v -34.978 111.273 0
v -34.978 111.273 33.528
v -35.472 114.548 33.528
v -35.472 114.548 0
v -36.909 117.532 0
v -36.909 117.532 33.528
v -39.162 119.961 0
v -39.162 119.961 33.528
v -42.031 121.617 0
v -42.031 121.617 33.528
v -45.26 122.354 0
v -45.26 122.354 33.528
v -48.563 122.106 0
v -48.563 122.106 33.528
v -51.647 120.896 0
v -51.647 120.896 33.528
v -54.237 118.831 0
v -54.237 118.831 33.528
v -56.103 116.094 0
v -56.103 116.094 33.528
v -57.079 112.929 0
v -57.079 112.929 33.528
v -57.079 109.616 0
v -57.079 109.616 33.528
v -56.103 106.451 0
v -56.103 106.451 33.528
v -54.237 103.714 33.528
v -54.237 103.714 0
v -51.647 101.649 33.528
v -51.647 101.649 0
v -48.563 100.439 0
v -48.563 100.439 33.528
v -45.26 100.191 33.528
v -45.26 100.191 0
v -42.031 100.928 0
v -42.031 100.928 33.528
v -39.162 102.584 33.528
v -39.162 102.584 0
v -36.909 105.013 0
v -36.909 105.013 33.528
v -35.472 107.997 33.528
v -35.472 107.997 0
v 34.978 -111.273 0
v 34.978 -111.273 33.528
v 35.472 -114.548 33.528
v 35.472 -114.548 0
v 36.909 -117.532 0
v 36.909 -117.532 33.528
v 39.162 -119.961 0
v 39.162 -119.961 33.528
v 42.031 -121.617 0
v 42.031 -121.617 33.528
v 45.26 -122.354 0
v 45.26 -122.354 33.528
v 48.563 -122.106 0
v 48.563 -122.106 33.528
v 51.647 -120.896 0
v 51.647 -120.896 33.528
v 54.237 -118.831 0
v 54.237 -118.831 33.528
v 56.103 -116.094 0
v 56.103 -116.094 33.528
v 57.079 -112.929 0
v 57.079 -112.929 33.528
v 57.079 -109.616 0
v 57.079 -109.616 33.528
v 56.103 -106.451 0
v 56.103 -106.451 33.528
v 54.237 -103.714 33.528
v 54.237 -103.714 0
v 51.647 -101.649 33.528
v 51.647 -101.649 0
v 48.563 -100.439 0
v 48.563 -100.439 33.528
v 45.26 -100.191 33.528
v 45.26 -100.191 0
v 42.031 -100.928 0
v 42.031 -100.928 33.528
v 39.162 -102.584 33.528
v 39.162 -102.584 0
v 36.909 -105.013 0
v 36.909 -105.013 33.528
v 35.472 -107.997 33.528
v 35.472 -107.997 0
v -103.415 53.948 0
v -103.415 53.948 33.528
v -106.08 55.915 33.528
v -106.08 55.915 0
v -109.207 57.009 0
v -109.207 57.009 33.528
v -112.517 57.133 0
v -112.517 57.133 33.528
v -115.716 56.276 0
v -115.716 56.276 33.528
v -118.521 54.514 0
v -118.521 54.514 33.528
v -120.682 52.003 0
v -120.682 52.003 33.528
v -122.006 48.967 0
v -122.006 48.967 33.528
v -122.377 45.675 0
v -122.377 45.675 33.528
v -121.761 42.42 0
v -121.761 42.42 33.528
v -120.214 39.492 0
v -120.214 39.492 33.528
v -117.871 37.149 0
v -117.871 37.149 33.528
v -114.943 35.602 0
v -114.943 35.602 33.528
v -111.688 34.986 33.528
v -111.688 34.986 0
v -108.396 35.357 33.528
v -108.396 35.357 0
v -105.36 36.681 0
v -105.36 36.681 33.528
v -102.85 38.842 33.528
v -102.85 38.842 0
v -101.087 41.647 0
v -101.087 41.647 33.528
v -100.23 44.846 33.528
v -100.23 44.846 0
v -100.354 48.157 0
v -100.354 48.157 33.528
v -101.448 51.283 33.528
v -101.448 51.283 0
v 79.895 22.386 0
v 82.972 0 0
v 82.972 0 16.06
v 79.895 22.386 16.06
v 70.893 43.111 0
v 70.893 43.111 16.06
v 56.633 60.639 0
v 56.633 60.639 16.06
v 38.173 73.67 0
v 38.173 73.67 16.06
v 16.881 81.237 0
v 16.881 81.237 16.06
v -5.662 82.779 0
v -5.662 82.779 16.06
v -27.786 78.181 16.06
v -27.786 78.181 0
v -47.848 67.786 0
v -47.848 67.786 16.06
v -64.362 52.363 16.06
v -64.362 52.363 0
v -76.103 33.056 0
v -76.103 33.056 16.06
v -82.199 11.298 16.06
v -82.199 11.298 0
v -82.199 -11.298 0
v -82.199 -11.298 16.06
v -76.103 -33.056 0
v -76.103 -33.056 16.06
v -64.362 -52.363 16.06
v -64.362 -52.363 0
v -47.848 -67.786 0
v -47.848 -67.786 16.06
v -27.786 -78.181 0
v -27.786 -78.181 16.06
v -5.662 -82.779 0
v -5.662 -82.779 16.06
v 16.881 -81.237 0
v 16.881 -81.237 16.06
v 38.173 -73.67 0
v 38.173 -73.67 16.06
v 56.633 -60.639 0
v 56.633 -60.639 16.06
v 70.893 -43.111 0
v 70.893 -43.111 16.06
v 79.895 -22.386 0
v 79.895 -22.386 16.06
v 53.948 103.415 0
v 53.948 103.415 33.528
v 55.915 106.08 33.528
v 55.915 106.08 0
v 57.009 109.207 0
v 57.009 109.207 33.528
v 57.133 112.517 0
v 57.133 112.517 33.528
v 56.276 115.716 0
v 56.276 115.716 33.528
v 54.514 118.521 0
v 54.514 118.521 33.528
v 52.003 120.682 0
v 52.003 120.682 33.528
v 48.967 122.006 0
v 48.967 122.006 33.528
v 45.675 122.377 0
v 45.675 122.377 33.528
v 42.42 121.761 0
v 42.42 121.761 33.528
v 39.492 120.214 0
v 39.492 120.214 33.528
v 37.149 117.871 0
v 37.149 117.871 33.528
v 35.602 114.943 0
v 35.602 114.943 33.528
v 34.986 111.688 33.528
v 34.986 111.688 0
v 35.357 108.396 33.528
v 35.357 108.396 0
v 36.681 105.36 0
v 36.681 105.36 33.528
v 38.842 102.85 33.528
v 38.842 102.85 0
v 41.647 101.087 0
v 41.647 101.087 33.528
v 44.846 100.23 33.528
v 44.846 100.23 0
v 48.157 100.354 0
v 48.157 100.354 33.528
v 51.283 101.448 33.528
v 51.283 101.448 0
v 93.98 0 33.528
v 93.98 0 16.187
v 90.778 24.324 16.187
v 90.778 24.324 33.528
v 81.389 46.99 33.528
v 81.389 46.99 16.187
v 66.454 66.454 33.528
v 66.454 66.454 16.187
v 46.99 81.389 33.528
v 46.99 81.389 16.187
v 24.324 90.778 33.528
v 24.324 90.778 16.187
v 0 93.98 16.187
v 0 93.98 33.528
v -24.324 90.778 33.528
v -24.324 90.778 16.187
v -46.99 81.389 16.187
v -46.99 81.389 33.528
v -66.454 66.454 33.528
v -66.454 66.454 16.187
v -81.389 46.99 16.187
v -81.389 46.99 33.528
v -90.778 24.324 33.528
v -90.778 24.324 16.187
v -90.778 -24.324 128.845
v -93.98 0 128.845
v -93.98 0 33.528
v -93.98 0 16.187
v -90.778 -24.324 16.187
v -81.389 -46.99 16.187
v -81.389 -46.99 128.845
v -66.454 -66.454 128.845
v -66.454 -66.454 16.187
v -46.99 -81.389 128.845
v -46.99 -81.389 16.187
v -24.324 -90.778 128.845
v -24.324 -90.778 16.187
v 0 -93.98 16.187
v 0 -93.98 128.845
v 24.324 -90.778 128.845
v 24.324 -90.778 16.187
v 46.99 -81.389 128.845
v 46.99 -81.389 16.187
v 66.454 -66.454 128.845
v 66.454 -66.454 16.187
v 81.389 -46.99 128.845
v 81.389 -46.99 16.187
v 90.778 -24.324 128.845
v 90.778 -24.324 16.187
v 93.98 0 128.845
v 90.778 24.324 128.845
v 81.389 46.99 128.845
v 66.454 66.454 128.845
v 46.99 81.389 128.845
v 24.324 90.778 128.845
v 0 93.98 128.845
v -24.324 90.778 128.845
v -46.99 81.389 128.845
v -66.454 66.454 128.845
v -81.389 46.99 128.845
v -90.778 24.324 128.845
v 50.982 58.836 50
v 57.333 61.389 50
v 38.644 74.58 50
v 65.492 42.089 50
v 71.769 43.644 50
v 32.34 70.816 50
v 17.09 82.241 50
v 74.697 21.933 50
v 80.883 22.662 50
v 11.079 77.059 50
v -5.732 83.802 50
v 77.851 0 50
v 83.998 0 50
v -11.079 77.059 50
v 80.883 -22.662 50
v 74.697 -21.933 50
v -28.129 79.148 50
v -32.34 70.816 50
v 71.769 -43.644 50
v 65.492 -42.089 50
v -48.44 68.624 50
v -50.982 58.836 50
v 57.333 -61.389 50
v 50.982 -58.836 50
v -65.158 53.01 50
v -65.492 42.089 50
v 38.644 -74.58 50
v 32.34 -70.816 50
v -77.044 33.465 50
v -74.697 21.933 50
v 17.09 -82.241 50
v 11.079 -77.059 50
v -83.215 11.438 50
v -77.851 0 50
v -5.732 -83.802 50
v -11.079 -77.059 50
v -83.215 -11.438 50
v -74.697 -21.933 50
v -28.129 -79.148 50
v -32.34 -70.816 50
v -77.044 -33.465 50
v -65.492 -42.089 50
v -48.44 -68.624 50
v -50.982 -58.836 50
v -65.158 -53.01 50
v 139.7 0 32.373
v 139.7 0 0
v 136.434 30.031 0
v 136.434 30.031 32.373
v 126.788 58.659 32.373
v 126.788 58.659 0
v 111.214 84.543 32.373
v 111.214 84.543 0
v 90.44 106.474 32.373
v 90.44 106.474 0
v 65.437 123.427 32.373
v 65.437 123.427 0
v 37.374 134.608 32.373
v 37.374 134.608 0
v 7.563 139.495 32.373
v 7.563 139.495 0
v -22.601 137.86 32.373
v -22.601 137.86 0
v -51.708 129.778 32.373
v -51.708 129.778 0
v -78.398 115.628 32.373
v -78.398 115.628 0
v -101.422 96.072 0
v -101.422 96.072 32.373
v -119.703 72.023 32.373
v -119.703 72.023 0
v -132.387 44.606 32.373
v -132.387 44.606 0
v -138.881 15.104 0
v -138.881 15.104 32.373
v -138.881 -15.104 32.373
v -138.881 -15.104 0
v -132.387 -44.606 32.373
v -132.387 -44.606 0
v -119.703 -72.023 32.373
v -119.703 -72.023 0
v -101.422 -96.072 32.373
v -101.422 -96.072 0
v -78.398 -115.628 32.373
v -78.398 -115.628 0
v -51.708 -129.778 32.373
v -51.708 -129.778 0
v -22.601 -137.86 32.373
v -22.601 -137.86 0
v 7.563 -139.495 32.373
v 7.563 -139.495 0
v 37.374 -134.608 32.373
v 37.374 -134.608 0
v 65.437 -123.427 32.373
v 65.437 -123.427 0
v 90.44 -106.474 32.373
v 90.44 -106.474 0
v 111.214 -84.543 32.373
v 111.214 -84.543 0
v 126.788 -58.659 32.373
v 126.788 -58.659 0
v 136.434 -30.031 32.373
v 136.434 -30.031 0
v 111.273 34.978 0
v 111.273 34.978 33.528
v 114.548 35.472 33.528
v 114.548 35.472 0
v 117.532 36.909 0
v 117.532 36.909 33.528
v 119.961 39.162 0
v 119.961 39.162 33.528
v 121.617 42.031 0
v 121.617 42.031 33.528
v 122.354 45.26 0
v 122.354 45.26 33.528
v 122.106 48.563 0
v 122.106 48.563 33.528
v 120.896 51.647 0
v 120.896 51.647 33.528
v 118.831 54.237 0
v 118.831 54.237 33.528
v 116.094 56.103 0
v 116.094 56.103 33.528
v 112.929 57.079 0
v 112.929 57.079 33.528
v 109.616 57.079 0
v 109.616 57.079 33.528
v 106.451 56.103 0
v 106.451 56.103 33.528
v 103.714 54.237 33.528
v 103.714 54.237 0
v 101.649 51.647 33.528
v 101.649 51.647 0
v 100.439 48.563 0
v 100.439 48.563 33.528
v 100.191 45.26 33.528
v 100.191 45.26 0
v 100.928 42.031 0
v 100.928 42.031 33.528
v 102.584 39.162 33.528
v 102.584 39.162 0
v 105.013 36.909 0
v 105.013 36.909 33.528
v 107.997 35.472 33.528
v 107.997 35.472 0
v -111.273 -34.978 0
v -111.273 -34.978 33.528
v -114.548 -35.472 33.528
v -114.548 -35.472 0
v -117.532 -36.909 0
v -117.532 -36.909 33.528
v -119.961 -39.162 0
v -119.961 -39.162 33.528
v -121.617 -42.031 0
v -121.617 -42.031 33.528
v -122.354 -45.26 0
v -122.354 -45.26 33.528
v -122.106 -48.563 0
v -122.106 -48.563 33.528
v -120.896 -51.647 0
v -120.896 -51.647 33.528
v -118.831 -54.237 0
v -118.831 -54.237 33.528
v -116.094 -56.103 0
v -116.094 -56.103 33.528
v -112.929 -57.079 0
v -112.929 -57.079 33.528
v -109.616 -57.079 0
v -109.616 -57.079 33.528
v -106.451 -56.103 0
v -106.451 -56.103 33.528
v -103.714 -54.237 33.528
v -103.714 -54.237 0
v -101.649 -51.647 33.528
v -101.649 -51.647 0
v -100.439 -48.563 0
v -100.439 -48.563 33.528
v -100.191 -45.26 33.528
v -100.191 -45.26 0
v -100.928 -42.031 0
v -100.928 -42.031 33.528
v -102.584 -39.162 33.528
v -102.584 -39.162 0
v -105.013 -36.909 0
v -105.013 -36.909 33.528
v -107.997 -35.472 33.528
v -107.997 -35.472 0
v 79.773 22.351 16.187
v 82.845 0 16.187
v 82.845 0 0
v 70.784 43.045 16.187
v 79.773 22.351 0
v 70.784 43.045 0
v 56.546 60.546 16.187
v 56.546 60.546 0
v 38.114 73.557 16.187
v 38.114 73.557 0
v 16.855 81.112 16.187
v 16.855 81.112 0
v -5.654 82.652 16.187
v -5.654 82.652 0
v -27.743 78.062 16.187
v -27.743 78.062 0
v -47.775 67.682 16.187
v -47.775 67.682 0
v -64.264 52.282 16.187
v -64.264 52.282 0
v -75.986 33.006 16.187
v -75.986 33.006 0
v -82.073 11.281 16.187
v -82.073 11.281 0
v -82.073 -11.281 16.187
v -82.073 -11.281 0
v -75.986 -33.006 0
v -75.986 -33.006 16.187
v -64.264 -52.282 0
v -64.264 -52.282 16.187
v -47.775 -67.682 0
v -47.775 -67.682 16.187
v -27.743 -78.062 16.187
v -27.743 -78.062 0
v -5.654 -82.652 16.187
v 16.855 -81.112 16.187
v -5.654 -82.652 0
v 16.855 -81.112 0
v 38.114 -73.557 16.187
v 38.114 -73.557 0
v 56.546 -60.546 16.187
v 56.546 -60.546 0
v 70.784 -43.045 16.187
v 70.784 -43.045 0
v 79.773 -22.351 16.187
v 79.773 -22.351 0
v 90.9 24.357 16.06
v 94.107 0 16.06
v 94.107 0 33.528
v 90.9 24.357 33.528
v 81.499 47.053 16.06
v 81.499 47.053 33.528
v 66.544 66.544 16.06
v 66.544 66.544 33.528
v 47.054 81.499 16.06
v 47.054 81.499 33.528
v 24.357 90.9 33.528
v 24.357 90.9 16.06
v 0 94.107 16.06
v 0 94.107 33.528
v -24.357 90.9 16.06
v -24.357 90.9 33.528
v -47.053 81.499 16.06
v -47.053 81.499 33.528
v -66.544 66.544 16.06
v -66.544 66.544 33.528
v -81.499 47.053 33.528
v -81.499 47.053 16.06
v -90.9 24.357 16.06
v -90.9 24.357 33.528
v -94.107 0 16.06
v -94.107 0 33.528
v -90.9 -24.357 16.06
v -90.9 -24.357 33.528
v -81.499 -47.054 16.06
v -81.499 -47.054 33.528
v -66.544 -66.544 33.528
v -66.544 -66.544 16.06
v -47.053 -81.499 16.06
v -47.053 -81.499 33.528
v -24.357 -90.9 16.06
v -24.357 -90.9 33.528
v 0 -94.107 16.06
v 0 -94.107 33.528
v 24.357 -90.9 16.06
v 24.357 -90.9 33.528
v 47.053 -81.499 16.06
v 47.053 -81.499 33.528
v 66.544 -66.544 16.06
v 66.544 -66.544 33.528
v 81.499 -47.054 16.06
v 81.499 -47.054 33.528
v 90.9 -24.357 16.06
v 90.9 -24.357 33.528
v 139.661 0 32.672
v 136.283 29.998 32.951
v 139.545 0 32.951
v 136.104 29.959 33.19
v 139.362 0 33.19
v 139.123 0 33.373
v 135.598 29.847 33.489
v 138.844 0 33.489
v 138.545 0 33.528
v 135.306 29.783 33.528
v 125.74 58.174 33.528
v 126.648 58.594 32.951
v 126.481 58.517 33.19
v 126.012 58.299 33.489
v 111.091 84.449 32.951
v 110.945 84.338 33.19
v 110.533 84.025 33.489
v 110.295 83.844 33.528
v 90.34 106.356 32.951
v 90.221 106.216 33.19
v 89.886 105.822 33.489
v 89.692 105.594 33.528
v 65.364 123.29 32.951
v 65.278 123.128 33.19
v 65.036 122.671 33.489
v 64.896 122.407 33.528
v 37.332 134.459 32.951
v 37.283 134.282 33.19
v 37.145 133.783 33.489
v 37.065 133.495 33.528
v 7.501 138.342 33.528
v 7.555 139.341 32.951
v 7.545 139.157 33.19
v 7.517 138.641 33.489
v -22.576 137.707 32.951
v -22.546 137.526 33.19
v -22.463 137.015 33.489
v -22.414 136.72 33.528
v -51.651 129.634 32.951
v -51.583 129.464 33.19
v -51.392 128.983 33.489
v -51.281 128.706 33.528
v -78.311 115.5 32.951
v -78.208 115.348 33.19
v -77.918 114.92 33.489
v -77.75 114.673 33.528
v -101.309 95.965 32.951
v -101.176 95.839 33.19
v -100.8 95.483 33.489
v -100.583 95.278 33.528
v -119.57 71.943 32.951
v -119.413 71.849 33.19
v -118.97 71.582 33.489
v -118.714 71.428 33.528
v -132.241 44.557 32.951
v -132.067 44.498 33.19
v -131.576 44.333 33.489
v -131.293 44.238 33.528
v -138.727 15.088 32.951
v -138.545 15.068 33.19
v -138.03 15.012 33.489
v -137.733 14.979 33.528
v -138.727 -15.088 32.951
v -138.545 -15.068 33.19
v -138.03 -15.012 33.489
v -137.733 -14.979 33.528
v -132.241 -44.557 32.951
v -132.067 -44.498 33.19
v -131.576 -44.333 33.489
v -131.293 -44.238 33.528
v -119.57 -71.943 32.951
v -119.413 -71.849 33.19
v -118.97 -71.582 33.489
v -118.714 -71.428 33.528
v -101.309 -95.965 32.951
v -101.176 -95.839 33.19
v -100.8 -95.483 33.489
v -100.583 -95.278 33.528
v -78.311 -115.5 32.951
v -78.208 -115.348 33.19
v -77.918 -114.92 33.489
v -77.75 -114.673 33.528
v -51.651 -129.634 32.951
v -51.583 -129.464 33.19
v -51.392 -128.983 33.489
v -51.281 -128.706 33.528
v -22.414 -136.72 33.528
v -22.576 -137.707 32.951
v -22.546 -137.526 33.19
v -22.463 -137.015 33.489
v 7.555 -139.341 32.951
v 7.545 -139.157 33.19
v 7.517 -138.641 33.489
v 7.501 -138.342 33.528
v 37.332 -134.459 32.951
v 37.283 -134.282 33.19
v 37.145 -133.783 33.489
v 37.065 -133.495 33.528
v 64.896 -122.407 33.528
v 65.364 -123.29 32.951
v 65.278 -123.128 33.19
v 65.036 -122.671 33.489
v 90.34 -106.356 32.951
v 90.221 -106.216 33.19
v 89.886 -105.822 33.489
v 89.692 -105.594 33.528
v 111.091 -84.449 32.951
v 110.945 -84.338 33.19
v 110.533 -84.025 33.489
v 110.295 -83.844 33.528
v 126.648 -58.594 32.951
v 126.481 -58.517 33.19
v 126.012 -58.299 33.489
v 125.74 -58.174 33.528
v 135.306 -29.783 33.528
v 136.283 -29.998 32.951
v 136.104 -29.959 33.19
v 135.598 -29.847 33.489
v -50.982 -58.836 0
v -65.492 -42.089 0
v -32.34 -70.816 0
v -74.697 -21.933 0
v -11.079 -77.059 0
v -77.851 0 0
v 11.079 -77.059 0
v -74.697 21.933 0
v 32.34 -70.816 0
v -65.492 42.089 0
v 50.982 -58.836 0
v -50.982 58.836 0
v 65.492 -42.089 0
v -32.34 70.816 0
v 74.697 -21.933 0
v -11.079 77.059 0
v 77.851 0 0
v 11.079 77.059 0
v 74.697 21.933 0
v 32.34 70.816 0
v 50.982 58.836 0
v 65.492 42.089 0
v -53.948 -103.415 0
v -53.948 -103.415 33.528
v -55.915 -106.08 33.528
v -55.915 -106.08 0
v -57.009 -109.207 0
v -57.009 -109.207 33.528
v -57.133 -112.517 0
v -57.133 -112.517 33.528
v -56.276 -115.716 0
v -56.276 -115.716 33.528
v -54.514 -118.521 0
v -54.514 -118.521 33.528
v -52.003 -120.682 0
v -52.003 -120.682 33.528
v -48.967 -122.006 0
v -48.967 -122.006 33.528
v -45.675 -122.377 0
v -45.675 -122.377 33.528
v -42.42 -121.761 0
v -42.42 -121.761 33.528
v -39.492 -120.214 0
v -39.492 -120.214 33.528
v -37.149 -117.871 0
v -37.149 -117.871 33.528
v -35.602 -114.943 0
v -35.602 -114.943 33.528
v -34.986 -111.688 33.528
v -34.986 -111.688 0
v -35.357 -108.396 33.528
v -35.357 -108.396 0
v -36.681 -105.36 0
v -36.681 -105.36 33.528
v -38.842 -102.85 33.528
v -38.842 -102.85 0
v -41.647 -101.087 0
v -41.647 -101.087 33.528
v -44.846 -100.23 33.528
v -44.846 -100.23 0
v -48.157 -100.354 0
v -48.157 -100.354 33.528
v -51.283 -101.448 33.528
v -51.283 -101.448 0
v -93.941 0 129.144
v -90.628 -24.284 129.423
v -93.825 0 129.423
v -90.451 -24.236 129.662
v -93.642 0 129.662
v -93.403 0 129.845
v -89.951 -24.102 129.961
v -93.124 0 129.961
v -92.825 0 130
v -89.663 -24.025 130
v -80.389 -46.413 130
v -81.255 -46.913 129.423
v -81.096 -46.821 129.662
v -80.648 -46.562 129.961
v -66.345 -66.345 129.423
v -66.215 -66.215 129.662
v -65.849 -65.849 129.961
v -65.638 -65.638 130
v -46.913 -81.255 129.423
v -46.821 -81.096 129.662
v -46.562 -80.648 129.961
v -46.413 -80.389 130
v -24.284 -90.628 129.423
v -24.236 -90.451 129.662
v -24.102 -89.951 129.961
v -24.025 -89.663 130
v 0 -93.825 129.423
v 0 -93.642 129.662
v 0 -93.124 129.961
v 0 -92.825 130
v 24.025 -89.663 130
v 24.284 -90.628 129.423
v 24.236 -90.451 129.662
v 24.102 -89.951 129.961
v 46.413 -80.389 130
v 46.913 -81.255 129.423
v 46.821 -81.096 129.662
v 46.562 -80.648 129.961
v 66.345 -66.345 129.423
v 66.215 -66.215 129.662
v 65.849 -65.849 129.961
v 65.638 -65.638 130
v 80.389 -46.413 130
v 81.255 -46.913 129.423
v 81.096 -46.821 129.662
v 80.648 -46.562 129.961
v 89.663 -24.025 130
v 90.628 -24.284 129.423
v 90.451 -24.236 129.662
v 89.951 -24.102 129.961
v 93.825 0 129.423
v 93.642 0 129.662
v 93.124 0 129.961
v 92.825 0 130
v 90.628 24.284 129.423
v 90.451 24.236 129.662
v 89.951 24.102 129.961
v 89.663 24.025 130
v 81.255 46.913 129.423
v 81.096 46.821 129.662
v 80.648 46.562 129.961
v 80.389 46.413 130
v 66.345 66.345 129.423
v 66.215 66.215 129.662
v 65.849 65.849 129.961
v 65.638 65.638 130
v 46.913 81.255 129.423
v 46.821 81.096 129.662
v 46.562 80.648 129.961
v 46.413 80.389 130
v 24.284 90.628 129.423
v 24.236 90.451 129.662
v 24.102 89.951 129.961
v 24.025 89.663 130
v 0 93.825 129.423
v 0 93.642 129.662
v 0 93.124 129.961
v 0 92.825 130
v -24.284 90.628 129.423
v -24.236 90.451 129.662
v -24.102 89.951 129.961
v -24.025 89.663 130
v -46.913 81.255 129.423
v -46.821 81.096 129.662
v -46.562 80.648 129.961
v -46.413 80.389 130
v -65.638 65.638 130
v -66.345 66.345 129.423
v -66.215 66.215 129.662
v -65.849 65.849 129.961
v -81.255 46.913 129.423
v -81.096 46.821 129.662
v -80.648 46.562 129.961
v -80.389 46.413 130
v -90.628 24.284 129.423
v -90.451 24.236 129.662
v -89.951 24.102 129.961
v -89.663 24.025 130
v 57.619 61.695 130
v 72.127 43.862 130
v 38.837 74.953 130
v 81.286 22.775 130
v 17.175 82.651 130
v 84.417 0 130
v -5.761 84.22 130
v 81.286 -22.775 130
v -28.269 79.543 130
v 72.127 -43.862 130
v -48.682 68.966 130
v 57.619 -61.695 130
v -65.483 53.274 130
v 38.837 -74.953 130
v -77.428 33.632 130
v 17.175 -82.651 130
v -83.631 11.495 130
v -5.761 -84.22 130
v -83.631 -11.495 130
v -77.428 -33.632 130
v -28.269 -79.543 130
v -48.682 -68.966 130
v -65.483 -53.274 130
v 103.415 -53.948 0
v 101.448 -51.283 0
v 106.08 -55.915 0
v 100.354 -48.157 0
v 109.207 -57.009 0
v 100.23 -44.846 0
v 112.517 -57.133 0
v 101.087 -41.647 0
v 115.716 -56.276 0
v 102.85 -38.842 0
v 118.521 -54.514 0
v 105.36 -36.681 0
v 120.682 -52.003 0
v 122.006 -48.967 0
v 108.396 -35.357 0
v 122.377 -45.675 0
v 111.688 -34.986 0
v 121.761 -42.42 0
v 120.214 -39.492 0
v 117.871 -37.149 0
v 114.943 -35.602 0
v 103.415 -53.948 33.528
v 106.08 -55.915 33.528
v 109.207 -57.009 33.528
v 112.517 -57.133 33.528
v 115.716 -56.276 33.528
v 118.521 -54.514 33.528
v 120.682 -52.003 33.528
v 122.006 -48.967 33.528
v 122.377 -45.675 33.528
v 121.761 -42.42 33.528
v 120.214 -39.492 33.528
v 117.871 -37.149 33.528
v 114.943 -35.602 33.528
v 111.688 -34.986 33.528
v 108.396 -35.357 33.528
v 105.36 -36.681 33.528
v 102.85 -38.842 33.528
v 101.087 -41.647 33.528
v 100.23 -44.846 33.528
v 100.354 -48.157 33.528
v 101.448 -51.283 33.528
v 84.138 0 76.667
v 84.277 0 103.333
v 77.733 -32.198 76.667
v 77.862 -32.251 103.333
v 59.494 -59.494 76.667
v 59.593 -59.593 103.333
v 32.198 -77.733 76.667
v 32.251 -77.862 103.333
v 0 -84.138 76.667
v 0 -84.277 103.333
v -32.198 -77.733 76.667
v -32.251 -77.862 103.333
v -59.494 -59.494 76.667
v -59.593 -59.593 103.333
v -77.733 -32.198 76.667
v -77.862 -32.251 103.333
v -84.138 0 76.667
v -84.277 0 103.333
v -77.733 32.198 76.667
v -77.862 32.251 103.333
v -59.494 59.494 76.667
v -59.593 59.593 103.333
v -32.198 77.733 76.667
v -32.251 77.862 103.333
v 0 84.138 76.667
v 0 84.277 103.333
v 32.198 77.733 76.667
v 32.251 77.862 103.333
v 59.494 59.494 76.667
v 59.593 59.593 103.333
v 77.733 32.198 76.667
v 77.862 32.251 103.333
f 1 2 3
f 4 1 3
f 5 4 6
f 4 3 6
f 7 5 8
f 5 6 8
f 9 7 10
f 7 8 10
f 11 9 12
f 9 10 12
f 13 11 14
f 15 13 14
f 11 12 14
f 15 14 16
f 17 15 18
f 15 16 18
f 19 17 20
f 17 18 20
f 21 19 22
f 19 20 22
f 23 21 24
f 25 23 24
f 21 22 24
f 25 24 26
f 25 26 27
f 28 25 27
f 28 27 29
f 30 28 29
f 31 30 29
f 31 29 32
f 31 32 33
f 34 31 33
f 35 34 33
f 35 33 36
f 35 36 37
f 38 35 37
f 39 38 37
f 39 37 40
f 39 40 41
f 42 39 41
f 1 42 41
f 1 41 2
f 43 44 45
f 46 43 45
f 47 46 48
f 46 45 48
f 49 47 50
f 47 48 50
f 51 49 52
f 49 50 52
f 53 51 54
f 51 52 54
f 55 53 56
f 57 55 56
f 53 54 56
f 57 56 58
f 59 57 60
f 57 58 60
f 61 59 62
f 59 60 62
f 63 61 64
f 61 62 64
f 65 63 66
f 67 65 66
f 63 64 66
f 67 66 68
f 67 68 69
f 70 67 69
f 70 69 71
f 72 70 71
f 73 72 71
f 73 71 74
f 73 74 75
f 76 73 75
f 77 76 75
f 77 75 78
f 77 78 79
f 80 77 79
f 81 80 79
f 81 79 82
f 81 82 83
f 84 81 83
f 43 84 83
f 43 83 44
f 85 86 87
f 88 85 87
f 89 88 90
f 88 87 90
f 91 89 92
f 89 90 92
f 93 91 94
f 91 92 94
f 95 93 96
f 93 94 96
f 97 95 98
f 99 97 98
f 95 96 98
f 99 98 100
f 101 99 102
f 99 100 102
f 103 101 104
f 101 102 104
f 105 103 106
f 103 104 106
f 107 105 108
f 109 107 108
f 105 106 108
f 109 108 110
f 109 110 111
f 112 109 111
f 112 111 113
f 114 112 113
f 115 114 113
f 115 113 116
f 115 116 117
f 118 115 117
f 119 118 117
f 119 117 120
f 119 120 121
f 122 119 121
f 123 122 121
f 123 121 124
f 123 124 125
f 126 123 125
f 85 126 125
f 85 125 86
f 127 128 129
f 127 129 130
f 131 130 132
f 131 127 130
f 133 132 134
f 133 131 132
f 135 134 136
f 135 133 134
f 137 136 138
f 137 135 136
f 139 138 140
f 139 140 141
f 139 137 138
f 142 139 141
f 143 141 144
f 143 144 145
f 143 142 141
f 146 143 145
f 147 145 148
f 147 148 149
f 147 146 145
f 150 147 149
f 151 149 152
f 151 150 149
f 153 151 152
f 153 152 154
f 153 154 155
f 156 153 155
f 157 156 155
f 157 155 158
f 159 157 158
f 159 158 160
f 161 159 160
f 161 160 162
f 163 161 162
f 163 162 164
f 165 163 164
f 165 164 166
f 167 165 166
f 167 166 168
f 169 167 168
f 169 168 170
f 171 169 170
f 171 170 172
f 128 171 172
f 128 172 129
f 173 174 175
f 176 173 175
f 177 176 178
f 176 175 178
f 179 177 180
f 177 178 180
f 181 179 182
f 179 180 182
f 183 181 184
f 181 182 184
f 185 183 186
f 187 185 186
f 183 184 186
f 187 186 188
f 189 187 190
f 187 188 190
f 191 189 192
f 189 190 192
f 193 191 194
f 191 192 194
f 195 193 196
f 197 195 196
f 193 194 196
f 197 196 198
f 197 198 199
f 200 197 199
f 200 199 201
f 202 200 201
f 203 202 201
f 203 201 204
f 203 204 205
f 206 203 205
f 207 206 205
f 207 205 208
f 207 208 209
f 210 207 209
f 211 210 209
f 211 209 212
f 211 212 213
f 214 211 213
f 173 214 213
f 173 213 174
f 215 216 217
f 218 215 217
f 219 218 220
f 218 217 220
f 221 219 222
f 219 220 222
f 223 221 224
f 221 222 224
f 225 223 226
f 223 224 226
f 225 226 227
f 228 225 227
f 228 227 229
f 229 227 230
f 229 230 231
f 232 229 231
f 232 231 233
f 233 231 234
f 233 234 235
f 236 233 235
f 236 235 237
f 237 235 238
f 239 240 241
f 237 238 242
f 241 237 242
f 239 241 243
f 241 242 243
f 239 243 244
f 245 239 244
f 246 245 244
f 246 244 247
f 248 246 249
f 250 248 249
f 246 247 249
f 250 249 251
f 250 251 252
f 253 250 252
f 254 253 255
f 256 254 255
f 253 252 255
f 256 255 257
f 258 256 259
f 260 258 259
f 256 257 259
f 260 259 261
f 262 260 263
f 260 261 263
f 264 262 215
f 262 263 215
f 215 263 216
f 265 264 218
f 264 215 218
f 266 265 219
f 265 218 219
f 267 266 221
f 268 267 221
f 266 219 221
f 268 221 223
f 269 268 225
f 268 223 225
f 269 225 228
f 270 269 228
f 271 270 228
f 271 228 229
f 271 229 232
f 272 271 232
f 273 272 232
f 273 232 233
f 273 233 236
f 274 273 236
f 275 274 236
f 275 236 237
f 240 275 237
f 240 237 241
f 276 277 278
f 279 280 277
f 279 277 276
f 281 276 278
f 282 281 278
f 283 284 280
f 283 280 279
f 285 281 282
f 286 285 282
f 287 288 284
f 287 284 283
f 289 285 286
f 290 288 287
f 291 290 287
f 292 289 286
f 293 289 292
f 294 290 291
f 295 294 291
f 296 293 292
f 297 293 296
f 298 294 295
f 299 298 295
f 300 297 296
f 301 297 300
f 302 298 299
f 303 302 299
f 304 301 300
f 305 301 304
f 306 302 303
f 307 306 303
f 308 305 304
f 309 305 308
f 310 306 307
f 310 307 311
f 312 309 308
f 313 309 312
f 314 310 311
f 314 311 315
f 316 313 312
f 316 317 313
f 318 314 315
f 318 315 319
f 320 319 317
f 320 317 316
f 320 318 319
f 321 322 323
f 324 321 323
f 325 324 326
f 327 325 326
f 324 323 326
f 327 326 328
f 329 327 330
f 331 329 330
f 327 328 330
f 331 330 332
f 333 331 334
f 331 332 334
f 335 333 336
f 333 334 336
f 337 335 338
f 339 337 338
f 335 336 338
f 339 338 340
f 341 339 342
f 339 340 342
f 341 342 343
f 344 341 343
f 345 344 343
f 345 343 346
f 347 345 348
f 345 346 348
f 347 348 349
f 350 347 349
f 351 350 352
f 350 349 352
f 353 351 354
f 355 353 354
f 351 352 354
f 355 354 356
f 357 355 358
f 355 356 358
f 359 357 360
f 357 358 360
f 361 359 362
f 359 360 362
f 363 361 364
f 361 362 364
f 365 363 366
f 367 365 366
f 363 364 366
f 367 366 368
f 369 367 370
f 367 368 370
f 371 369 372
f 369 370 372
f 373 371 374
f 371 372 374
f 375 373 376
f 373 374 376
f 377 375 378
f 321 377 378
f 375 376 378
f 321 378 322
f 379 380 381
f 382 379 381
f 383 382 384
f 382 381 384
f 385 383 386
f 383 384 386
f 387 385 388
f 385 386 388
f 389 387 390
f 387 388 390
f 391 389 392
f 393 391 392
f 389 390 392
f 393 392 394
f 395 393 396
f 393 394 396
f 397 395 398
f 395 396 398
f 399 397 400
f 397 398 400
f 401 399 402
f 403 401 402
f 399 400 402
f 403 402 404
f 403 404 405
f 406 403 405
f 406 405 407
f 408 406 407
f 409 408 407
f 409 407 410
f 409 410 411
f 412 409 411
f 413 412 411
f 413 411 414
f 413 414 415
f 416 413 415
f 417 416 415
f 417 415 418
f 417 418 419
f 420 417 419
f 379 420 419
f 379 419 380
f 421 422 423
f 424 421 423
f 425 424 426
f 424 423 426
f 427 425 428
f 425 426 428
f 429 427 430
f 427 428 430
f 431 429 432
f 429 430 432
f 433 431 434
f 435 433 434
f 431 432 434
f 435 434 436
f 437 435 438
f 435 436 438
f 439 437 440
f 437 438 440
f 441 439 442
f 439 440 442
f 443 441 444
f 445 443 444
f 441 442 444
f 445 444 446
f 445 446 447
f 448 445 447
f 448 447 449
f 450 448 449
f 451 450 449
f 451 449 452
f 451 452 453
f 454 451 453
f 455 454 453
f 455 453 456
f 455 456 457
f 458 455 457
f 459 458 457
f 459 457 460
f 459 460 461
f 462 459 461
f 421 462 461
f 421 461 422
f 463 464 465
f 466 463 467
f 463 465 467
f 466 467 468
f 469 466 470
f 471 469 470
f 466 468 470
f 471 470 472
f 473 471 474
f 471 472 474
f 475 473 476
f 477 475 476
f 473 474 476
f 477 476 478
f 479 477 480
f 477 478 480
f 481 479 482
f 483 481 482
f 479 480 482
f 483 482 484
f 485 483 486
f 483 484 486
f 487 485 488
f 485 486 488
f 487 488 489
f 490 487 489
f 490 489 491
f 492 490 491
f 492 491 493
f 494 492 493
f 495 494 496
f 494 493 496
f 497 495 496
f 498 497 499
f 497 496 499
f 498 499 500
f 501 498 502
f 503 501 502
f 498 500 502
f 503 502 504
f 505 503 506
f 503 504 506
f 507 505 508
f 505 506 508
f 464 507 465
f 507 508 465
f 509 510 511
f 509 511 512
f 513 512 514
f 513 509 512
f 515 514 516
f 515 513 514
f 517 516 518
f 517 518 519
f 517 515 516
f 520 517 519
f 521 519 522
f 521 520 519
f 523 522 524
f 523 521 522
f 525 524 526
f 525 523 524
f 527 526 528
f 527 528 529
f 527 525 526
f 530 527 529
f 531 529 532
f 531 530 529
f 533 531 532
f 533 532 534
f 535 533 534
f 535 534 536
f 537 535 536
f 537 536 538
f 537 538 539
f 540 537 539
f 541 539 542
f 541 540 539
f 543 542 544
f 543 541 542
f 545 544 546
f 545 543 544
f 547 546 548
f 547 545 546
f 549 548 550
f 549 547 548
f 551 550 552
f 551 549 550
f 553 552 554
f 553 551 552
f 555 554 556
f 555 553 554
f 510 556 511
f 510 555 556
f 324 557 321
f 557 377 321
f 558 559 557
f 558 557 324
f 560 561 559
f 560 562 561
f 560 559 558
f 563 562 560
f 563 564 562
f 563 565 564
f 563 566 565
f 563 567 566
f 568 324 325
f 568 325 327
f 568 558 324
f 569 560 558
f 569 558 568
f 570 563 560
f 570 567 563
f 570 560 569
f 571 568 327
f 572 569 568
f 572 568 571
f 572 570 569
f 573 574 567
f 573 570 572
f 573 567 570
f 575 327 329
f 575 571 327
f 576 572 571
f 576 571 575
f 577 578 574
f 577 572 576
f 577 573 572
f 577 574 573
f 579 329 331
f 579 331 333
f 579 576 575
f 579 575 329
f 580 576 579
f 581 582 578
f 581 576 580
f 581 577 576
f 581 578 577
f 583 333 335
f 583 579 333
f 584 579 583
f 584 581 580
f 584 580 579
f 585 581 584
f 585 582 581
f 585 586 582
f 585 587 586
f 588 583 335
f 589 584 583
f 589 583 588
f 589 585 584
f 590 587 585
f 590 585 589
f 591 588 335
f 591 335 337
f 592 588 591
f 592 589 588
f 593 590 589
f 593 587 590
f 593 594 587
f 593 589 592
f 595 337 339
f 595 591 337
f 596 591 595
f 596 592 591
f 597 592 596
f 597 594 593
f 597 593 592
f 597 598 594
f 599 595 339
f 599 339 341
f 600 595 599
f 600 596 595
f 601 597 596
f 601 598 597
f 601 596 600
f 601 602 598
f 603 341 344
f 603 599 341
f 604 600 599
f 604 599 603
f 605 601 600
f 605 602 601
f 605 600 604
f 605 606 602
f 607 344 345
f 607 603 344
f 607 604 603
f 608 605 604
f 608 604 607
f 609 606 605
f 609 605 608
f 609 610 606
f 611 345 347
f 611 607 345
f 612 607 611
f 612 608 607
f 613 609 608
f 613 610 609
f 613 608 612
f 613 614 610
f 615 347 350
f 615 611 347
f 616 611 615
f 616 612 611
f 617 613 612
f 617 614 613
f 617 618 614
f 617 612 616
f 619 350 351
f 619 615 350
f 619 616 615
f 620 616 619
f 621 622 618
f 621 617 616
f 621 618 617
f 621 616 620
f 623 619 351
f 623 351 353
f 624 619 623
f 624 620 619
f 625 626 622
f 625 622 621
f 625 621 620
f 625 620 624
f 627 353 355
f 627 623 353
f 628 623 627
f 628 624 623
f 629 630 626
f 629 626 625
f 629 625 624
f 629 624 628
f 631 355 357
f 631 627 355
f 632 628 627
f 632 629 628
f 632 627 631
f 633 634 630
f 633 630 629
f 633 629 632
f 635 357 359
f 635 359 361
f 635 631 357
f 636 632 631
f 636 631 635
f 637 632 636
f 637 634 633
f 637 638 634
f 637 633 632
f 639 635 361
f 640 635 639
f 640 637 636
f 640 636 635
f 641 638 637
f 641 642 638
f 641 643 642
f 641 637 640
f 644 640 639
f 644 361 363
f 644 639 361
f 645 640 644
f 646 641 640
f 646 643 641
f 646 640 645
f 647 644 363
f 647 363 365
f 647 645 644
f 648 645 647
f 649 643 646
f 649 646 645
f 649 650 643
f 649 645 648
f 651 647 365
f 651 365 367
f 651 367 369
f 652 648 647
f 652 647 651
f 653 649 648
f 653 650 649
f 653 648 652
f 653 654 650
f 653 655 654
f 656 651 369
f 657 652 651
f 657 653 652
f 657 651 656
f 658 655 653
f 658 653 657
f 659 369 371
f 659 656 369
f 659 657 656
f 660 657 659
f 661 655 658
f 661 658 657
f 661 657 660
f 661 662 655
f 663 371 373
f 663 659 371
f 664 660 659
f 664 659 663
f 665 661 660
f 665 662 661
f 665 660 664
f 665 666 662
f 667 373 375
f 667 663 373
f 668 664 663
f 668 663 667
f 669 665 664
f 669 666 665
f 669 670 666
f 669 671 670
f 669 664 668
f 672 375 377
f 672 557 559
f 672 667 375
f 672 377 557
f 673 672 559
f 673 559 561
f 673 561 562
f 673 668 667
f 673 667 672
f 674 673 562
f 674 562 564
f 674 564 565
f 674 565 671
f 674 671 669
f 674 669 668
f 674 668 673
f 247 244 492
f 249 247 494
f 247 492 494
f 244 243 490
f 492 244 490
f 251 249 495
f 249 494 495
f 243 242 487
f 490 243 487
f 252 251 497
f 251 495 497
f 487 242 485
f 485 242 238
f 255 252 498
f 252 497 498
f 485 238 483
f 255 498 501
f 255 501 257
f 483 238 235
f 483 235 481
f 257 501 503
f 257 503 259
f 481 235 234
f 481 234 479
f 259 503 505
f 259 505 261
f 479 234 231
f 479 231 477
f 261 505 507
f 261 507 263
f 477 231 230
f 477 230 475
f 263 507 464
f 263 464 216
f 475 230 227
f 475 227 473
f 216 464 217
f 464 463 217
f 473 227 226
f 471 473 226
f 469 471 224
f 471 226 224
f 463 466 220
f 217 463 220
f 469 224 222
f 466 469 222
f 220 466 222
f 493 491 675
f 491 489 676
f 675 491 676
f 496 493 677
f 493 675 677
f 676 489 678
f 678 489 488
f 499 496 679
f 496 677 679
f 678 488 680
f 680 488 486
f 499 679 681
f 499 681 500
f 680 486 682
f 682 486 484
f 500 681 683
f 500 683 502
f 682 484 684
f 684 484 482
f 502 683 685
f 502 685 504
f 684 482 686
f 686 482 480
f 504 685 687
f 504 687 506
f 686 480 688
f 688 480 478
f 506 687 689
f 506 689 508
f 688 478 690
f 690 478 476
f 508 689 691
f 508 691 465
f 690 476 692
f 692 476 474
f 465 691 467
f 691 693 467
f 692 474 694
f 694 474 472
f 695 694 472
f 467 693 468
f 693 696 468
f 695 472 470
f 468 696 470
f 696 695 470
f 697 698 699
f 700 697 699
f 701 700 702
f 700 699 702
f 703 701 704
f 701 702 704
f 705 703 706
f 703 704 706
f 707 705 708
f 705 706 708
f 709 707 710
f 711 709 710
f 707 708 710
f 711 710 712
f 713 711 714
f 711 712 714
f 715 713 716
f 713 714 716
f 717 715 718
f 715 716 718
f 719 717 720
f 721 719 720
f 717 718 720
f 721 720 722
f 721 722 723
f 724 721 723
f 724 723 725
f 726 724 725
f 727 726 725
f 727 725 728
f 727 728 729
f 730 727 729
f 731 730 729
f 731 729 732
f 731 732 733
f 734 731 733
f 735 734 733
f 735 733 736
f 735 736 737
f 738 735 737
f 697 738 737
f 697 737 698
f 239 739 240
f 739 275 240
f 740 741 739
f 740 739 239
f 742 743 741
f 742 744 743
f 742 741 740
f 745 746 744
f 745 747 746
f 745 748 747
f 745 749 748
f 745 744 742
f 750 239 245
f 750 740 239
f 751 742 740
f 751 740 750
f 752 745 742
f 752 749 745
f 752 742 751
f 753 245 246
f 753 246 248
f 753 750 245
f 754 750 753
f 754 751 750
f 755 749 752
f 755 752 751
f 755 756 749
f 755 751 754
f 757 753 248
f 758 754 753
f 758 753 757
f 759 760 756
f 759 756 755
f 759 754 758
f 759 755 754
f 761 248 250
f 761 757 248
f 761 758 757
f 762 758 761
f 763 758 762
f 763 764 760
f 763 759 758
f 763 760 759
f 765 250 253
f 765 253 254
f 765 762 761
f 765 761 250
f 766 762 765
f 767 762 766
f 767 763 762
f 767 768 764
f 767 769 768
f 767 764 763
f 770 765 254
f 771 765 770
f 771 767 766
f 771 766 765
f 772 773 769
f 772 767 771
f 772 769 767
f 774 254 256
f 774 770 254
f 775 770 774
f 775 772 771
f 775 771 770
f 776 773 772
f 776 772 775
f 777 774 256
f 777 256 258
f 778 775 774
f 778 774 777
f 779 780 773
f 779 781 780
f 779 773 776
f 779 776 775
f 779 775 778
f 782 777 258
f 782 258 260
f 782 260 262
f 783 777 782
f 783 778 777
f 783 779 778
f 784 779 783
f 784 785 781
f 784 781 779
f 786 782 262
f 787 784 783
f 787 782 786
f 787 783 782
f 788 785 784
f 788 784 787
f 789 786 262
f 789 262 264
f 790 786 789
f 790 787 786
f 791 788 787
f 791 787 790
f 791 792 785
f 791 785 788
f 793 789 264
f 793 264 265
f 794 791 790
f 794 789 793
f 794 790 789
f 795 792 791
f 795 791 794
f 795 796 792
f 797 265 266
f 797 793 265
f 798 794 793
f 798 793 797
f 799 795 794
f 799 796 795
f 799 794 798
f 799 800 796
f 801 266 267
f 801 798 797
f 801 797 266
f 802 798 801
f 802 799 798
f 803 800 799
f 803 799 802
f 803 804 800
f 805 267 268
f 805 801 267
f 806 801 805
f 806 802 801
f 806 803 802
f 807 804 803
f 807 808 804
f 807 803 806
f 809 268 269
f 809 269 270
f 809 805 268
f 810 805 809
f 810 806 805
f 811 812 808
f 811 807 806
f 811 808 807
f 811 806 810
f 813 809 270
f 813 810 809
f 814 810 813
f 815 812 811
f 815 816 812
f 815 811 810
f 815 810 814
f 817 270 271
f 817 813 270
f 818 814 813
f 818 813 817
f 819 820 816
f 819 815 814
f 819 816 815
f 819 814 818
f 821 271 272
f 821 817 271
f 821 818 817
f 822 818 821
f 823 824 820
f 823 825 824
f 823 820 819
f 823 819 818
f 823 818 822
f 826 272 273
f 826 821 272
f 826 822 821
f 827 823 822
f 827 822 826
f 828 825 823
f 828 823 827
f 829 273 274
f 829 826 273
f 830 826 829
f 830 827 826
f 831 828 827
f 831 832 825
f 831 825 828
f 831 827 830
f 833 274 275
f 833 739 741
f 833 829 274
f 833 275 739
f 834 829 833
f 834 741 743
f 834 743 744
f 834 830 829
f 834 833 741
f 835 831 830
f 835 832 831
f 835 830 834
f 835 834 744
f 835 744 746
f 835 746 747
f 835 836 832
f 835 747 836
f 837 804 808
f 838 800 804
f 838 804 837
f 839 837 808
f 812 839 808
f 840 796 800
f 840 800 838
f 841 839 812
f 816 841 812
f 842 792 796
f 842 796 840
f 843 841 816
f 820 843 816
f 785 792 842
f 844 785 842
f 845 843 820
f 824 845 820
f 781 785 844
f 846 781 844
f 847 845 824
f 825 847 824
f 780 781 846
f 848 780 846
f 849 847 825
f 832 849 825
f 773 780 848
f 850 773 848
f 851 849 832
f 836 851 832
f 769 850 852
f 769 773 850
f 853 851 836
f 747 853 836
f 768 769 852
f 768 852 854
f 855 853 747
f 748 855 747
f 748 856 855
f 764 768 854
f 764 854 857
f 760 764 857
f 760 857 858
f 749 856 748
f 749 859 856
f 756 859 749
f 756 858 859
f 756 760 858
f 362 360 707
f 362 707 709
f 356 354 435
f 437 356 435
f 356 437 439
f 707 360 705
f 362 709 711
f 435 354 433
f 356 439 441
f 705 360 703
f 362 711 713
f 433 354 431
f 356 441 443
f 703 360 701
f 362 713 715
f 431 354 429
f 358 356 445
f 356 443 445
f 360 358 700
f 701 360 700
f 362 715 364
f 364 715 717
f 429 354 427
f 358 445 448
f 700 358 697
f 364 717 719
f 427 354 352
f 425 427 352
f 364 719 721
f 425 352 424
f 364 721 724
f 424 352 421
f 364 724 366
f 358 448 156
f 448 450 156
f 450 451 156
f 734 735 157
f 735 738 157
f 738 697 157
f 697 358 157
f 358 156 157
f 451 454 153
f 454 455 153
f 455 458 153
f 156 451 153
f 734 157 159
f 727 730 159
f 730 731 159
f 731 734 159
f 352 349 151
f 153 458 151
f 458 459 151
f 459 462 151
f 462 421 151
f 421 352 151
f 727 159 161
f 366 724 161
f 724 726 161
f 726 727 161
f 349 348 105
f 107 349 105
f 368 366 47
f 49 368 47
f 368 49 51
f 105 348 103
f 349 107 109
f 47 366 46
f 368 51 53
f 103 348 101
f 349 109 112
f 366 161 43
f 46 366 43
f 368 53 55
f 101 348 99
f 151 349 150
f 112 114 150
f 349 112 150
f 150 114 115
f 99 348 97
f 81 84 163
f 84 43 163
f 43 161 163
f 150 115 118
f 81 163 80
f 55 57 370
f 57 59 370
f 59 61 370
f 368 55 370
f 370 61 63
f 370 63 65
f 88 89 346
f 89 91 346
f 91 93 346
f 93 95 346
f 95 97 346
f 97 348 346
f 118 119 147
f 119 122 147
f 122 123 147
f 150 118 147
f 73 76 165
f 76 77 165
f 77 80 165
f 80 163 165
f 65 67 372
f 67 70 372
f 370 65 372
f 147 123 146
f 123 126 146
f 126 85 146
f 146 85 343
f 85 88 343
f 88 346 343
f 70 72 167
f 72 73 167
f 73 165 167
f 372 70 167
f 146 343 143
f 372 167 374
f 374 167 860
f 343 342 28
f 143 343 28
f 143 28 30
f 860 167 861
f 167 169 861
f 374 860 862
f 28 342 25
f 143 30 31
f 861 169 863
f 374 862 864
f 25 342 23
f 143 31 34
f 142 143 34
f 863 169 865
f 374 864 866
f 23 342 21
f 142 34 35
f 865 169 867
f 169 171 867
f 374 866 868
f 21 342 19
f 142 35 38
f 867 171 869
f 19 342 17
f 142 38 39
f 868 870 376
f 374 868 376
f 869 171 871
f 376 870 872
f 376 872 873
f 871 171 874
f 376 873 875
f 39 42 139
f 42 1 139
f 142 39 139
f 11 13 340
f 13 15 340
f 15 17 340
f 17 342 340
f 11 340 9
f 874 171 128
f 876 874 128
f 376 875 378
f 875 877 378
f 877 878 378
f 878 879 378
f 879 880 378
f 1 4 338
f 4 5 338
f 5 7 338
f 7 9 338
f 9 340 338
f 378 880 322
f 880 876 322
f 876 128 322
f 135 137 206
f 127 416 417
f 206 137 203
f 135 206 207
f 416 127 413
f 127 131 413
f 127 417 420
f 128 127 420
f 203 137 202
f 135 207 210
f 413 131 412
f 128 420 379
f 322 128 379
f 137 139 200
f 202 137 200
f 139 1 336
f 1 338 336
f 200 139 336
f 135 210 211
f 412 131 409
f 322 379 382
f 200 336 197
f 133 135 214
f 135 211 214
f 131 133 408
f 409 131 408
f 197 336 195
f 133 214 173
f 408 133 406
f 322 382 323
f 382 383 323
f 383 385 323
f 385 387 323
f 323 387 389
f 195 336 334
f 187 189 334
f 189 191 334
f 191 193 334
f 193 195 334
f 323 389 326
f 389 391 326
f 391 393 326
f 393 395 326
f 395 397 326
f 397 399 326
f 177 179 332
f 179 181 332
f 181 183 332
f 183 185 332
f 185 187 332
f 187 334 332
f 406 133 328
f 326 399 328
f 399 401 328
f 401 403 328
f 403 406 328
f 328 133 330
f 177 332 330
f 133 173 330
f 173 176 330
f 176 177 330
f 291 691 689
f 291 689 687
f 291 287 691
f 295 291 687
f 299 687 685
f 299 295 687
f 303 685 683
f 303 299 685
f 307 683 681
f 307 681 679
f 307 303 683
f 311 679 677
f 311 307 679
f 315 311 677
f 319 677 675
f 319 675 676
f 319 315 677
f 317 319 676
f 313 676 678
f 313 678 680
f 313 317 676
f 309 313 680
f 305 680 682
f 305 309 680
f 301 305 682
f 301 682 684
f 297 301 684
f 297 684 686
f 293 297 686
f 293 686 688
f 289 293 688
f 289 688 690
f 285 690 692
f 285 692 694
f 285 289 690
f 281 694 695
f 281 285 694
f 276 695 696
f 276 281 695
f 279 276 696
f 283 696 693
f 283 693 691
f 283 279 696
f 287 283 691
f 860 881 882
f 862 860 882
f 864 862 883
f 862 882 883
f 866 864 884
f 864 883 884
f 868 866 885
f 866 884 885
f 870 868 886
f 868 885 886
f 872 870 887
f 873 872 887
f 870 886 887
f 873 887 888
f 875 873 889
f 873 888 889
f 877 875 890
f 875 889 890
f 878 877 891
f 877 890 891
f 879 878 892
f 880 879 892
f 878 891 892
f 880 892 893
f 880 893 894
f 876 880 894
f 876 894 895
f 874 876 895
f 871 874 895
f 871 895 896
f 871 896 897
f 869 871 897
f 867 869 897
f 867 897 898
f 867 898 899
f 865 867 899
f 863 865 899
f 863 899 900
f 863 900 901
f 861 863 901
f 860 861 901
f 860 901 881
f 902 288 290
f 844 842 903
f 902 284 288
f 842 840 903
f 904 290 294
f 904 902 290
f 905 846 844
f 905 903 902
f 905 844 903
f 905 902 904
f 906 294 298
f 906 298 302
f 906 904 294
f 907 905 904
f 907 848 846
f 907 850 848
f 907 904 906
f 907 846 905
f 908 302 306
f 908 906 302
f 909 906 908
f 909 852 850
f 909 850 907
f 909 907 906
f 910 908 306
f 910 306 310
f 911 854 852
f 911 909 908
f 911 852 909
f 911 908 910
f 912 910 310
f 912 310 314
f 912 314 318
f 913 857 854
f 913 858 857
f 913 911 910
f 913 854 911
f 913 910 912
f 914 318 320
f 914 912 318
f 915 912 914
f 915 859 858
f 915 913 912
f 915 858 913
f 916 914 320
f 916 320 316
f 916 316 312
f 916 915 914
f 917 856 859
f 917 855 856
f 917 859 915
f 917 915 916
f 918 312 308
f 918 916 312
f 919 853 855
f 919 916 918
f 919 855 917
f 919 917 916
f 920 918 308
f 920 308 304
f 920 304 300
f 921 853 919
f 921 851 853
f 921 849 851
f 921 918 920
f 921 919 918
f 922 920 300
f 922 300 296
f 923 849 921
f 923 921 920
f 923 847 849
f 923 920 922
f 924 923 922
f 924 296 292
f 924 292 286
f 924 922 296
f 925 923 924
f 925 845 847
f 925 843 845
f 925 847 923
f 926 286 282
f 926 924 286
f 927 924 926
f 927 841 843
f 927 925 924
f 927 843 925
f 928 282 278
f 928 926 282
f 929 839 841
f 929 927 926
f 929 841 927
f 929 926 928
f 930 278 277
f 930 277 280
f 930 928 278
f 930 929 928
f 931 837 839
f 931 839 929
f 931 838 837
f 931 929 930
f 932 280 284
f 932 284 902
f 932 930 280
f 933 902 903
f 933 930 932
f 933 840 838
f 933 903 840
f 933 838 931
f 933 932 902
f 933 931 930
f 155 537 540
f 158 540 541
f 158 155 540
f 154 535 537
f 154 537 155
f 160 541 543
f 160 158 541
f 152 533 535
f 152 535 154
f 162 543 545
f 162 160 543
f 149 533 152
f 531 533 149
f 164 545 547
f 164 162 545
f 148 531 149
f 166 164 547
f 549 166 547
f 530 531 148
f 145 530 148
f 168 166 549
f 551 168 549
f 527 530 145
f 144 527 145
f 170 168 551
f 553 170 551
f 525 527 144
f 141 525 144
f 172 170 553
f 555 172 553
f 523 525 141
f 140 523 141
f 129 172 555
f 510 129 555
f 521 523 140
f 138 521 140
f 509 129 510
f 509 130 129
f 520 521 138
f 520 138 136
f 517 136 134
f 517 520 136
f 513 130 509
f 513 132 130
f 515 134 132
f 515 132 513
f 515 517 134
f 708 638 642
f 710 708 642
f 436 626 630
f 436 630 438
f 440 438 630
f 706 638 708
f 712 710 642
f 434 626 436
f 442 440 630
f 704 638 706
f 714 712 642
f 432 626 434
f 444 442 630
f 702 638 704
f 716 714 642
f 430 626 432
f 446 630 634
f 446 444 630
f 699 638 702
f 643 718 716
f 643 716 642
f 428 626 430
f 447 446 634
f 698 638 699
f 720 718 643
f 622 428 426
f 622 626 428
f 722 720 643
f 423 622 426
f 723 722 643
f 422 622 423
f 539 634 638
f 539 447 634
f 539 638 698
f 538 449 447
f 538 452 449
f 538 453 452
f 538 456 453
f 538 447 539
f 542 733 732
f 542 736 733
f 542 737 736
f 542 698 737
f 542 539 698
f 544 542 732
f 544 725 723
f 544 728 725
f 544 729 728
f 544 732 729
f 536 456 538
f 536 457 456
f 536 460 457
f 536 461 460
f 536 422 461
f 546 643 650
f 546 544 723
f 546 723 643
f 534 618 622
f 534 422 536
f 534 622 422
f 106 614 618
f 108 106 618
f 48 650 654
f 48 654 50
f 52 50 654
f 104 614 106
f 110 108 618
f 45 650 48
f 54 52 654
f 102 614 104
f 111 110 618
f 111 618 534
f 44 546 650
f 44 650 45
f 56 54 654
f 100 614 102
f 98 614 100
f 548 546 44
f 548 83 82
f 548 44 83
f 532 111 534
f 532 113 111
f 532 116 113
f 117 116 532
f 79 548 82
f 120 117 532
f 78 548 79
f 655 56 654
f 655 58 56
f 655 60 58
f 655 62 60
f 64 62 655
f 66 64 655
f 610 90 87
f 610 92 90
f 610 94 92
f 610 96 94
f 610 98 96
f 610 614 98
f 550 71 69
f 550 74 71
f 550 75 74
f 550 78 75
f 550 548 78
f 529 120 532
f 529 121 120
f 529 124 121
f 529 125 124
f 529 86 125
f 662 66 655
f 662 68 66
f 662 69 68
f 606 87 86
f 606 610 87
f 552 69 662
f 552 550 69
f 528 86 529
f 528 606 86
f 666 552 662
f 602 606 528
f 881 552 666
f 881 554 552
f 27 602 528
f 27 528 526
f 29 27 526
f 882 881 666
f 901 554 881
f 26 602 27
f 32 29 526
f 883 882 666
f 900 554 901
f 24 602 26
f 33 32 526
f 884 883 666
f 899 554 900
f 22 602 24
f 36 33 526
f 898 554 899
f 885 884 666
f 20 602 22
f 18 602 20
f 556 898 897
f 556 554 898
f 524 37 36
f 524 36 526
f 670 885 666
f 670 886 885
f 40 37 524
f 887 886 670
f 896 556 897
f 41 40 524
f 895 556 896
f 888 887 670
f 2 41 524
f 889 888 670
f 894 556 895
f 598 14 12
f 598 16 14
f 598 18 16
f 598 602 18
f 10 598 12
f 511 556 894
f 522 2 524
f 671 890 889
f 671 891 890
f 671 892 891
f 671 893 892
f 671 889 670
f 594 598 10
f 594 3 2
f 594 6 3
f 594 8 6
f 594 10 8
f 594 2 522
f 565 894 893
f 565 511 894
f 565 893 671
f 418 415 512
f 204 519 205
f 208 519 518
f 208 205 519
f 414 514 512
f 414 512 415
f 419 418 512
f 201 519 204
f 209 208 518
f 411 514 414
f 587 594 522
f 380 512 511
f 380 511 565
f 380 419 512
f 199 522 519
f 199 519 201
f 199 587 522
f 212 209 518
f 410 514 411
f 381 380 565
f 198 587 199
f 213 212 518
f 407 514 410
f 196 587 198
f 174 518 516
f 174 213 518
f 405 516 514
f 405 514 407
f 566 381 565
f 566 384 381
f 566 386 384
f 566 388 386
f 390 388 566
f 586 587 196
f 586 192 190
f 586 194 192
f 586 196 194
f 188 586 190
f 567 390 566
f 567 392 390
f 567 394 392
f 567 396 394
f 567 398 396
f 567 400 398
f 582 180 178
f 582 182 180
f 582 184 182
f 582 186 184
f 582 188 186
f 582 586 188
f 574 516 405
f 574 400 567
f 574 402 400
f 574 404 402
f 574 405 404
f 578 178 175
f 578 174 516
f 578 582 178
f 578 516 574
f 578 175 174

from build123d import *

# Parameters (mm, degrees)
SKETCH1_R                       = 139.7
EXTRUDE1_DEPTH                  = 33.528
SKETCH2_R                       = 93.98
EXTRUDE2_DEPTH                  = 96.472
SKETCH3_R                       = 11.1125
EXTRUDE3_DEPTH                  = 220.861380838
CIRPATTERN1_COUNT               = 8
FILLET1_R                       = 1.154545455
CUT_REVOLVE_THIN1_START         = 16.059727273
CUT_REVOLVE_THIN1_OUTLINE_R     = 94.107
CUT_REVOLVE_THIN1_OUTLINE_R_2   = 93.98
CUT_REVOLVE_THIN1_DEPTH         = 17.468272727
CUT_REVOLVE_THIN1_2_OUTLINE_R   = 82.972009834
CUT_REVOLVE_THIN1_2_OUTLINE_R_2 = 82.845009834
CUT_REVOLVE_THIN1_2_DEPTH       = 16.186727273
CUT_REVOLVE_THIN1_3_OUTLINE_R   = 93.98
CUT_REVOLVE_THIN1_3_OUTLINE_R_2 = 82.972009834
CUT_REVOLVE_THIN1_3_DEPTH       = 0.127


# Read off the part's stored shape, not the designer's step: Cut-Revolve-Thin1
with BuildPart() as part:
    # Sketch1 → Extrude1 (new body)
    with BuildSketch(Plane.XY):
        Circle(SKETCH1_R)
    extrude(amount=EXTRUDE1_DEPTH)

    # Sketch2 → Extrude2 (add)
    with BuildSketch(Plane.XY.offset(33.528)):
        with Locations(Location((0, 0, 0), (0, 0, 180))):
            Circle(SKETCH2_R)
    extrude(amount=EXTRUDE2_DEPTH)

    # Sketch3 → Extrude3 (cut, through all)
    with BuildSketch(Plane.XY.offset(33.528)):
        with Locations((-46.090580656, 111.272504917)):
            Circle(SKETCH3_R)
    extrude3 = extrude(amount=-EXTRUDE3_DEPTH, mode=Mode.SUBTRACT)

    # CirPattern1: Extrude3 ×8 about axis
    cirpattern1_axis = Axis((0, 0, 0), (0, 0, 1))
    for i in range(1, CIRPATTERN1_COUNT):
        add(extrude3.rotate(cirpattern1_axis, i * 360 / CIRPATTERN1_COUNT), mode=Mode.SUBTRACT)

    # Fillet1
    fillet1_edges = [part.edges().sort_by_distance(p)[0] for p in [
        (-139.7, 0, 33.528),
        (93.98, 0, 130),
    ]]
    fillet(fillet1_edges, radius=FILLET1_R)

    # Sketch4 → Cut-Revolve1 (revolve, cut)
    with BuildSketch(Plane(origin=(0, 0, 62.70625), x_dir=(0, 0, 1), z_dir=(-1, 0, 0)), mode=Mode.PRIVATE) as cut_revolve1_sk:
        Polygon((-62.70625, 77.851), (-12.70625, 77.851), (-12.70625, 83.9978), (67.29375, 84.4169), (67.29375, 0), (-62.70625, 0), align=None)
    revolve(cut_revolve1_sk.sketch.rotate(Axis((0, 0, 130), (0, 0, -1)), 90), axis=Axis((0, 0, 130), (0, 0, -1)), mode=Mode.SUBTRACT)

    # Cut-Revolve-Thin1 outline → Cut-Revolve-Thin1 (cut)
    with BuildSketch(Plane.XY.offset(CUT_REVOLVE_THIN1_START)):
        Circle(CUT_REVOLVE_THIN1_OUTLINE_R)
        Circle(CUT_REVOLVE_THIN1_OUTLINE_R_2, mode=Mode.SUBTRACT)
    extrude(amount=CUT_REVOLVE_THIN1_DEPTH, mode=Mode.SUBTRACT)

    # Cut-Revolve-Thin1 2 outline → Cut-Revolve-Thin1 2 (cut)
    with BuildSketch(Plane.XY):
        Circle(CUT_REVOLVE_THIN1_2_OUTLINE_R)
        Circle(CUT_REVOLVE_THIN1_2_OUTLINE_R_2, mode=Mode.SUBTRACT)
    extrude(amount=CUT_REVOLVE_THIN1_2_DEPTH, mode=Mode.SUBTRACT)

    # Cut-Revolve-Thin1 3 outline → Cut-Revolve-Thin1 3 (cut)
    with BuildSketch(Plane.XY.offset(CUT_REVOLVE_THIN1_START)):
        Circle(CUT_REVOLVE_THIN1_3_OUTLINE_R)
        Circle(CUT_REVOLVE_THIN1_3_OUTLINE_R_2, mode=Mode.SUBTRACT)
    extrude(amount=CUT_REVOLVE_THIN1_3_DEPTH, mode=Mode.SUBTRACT)


solid = part.part
